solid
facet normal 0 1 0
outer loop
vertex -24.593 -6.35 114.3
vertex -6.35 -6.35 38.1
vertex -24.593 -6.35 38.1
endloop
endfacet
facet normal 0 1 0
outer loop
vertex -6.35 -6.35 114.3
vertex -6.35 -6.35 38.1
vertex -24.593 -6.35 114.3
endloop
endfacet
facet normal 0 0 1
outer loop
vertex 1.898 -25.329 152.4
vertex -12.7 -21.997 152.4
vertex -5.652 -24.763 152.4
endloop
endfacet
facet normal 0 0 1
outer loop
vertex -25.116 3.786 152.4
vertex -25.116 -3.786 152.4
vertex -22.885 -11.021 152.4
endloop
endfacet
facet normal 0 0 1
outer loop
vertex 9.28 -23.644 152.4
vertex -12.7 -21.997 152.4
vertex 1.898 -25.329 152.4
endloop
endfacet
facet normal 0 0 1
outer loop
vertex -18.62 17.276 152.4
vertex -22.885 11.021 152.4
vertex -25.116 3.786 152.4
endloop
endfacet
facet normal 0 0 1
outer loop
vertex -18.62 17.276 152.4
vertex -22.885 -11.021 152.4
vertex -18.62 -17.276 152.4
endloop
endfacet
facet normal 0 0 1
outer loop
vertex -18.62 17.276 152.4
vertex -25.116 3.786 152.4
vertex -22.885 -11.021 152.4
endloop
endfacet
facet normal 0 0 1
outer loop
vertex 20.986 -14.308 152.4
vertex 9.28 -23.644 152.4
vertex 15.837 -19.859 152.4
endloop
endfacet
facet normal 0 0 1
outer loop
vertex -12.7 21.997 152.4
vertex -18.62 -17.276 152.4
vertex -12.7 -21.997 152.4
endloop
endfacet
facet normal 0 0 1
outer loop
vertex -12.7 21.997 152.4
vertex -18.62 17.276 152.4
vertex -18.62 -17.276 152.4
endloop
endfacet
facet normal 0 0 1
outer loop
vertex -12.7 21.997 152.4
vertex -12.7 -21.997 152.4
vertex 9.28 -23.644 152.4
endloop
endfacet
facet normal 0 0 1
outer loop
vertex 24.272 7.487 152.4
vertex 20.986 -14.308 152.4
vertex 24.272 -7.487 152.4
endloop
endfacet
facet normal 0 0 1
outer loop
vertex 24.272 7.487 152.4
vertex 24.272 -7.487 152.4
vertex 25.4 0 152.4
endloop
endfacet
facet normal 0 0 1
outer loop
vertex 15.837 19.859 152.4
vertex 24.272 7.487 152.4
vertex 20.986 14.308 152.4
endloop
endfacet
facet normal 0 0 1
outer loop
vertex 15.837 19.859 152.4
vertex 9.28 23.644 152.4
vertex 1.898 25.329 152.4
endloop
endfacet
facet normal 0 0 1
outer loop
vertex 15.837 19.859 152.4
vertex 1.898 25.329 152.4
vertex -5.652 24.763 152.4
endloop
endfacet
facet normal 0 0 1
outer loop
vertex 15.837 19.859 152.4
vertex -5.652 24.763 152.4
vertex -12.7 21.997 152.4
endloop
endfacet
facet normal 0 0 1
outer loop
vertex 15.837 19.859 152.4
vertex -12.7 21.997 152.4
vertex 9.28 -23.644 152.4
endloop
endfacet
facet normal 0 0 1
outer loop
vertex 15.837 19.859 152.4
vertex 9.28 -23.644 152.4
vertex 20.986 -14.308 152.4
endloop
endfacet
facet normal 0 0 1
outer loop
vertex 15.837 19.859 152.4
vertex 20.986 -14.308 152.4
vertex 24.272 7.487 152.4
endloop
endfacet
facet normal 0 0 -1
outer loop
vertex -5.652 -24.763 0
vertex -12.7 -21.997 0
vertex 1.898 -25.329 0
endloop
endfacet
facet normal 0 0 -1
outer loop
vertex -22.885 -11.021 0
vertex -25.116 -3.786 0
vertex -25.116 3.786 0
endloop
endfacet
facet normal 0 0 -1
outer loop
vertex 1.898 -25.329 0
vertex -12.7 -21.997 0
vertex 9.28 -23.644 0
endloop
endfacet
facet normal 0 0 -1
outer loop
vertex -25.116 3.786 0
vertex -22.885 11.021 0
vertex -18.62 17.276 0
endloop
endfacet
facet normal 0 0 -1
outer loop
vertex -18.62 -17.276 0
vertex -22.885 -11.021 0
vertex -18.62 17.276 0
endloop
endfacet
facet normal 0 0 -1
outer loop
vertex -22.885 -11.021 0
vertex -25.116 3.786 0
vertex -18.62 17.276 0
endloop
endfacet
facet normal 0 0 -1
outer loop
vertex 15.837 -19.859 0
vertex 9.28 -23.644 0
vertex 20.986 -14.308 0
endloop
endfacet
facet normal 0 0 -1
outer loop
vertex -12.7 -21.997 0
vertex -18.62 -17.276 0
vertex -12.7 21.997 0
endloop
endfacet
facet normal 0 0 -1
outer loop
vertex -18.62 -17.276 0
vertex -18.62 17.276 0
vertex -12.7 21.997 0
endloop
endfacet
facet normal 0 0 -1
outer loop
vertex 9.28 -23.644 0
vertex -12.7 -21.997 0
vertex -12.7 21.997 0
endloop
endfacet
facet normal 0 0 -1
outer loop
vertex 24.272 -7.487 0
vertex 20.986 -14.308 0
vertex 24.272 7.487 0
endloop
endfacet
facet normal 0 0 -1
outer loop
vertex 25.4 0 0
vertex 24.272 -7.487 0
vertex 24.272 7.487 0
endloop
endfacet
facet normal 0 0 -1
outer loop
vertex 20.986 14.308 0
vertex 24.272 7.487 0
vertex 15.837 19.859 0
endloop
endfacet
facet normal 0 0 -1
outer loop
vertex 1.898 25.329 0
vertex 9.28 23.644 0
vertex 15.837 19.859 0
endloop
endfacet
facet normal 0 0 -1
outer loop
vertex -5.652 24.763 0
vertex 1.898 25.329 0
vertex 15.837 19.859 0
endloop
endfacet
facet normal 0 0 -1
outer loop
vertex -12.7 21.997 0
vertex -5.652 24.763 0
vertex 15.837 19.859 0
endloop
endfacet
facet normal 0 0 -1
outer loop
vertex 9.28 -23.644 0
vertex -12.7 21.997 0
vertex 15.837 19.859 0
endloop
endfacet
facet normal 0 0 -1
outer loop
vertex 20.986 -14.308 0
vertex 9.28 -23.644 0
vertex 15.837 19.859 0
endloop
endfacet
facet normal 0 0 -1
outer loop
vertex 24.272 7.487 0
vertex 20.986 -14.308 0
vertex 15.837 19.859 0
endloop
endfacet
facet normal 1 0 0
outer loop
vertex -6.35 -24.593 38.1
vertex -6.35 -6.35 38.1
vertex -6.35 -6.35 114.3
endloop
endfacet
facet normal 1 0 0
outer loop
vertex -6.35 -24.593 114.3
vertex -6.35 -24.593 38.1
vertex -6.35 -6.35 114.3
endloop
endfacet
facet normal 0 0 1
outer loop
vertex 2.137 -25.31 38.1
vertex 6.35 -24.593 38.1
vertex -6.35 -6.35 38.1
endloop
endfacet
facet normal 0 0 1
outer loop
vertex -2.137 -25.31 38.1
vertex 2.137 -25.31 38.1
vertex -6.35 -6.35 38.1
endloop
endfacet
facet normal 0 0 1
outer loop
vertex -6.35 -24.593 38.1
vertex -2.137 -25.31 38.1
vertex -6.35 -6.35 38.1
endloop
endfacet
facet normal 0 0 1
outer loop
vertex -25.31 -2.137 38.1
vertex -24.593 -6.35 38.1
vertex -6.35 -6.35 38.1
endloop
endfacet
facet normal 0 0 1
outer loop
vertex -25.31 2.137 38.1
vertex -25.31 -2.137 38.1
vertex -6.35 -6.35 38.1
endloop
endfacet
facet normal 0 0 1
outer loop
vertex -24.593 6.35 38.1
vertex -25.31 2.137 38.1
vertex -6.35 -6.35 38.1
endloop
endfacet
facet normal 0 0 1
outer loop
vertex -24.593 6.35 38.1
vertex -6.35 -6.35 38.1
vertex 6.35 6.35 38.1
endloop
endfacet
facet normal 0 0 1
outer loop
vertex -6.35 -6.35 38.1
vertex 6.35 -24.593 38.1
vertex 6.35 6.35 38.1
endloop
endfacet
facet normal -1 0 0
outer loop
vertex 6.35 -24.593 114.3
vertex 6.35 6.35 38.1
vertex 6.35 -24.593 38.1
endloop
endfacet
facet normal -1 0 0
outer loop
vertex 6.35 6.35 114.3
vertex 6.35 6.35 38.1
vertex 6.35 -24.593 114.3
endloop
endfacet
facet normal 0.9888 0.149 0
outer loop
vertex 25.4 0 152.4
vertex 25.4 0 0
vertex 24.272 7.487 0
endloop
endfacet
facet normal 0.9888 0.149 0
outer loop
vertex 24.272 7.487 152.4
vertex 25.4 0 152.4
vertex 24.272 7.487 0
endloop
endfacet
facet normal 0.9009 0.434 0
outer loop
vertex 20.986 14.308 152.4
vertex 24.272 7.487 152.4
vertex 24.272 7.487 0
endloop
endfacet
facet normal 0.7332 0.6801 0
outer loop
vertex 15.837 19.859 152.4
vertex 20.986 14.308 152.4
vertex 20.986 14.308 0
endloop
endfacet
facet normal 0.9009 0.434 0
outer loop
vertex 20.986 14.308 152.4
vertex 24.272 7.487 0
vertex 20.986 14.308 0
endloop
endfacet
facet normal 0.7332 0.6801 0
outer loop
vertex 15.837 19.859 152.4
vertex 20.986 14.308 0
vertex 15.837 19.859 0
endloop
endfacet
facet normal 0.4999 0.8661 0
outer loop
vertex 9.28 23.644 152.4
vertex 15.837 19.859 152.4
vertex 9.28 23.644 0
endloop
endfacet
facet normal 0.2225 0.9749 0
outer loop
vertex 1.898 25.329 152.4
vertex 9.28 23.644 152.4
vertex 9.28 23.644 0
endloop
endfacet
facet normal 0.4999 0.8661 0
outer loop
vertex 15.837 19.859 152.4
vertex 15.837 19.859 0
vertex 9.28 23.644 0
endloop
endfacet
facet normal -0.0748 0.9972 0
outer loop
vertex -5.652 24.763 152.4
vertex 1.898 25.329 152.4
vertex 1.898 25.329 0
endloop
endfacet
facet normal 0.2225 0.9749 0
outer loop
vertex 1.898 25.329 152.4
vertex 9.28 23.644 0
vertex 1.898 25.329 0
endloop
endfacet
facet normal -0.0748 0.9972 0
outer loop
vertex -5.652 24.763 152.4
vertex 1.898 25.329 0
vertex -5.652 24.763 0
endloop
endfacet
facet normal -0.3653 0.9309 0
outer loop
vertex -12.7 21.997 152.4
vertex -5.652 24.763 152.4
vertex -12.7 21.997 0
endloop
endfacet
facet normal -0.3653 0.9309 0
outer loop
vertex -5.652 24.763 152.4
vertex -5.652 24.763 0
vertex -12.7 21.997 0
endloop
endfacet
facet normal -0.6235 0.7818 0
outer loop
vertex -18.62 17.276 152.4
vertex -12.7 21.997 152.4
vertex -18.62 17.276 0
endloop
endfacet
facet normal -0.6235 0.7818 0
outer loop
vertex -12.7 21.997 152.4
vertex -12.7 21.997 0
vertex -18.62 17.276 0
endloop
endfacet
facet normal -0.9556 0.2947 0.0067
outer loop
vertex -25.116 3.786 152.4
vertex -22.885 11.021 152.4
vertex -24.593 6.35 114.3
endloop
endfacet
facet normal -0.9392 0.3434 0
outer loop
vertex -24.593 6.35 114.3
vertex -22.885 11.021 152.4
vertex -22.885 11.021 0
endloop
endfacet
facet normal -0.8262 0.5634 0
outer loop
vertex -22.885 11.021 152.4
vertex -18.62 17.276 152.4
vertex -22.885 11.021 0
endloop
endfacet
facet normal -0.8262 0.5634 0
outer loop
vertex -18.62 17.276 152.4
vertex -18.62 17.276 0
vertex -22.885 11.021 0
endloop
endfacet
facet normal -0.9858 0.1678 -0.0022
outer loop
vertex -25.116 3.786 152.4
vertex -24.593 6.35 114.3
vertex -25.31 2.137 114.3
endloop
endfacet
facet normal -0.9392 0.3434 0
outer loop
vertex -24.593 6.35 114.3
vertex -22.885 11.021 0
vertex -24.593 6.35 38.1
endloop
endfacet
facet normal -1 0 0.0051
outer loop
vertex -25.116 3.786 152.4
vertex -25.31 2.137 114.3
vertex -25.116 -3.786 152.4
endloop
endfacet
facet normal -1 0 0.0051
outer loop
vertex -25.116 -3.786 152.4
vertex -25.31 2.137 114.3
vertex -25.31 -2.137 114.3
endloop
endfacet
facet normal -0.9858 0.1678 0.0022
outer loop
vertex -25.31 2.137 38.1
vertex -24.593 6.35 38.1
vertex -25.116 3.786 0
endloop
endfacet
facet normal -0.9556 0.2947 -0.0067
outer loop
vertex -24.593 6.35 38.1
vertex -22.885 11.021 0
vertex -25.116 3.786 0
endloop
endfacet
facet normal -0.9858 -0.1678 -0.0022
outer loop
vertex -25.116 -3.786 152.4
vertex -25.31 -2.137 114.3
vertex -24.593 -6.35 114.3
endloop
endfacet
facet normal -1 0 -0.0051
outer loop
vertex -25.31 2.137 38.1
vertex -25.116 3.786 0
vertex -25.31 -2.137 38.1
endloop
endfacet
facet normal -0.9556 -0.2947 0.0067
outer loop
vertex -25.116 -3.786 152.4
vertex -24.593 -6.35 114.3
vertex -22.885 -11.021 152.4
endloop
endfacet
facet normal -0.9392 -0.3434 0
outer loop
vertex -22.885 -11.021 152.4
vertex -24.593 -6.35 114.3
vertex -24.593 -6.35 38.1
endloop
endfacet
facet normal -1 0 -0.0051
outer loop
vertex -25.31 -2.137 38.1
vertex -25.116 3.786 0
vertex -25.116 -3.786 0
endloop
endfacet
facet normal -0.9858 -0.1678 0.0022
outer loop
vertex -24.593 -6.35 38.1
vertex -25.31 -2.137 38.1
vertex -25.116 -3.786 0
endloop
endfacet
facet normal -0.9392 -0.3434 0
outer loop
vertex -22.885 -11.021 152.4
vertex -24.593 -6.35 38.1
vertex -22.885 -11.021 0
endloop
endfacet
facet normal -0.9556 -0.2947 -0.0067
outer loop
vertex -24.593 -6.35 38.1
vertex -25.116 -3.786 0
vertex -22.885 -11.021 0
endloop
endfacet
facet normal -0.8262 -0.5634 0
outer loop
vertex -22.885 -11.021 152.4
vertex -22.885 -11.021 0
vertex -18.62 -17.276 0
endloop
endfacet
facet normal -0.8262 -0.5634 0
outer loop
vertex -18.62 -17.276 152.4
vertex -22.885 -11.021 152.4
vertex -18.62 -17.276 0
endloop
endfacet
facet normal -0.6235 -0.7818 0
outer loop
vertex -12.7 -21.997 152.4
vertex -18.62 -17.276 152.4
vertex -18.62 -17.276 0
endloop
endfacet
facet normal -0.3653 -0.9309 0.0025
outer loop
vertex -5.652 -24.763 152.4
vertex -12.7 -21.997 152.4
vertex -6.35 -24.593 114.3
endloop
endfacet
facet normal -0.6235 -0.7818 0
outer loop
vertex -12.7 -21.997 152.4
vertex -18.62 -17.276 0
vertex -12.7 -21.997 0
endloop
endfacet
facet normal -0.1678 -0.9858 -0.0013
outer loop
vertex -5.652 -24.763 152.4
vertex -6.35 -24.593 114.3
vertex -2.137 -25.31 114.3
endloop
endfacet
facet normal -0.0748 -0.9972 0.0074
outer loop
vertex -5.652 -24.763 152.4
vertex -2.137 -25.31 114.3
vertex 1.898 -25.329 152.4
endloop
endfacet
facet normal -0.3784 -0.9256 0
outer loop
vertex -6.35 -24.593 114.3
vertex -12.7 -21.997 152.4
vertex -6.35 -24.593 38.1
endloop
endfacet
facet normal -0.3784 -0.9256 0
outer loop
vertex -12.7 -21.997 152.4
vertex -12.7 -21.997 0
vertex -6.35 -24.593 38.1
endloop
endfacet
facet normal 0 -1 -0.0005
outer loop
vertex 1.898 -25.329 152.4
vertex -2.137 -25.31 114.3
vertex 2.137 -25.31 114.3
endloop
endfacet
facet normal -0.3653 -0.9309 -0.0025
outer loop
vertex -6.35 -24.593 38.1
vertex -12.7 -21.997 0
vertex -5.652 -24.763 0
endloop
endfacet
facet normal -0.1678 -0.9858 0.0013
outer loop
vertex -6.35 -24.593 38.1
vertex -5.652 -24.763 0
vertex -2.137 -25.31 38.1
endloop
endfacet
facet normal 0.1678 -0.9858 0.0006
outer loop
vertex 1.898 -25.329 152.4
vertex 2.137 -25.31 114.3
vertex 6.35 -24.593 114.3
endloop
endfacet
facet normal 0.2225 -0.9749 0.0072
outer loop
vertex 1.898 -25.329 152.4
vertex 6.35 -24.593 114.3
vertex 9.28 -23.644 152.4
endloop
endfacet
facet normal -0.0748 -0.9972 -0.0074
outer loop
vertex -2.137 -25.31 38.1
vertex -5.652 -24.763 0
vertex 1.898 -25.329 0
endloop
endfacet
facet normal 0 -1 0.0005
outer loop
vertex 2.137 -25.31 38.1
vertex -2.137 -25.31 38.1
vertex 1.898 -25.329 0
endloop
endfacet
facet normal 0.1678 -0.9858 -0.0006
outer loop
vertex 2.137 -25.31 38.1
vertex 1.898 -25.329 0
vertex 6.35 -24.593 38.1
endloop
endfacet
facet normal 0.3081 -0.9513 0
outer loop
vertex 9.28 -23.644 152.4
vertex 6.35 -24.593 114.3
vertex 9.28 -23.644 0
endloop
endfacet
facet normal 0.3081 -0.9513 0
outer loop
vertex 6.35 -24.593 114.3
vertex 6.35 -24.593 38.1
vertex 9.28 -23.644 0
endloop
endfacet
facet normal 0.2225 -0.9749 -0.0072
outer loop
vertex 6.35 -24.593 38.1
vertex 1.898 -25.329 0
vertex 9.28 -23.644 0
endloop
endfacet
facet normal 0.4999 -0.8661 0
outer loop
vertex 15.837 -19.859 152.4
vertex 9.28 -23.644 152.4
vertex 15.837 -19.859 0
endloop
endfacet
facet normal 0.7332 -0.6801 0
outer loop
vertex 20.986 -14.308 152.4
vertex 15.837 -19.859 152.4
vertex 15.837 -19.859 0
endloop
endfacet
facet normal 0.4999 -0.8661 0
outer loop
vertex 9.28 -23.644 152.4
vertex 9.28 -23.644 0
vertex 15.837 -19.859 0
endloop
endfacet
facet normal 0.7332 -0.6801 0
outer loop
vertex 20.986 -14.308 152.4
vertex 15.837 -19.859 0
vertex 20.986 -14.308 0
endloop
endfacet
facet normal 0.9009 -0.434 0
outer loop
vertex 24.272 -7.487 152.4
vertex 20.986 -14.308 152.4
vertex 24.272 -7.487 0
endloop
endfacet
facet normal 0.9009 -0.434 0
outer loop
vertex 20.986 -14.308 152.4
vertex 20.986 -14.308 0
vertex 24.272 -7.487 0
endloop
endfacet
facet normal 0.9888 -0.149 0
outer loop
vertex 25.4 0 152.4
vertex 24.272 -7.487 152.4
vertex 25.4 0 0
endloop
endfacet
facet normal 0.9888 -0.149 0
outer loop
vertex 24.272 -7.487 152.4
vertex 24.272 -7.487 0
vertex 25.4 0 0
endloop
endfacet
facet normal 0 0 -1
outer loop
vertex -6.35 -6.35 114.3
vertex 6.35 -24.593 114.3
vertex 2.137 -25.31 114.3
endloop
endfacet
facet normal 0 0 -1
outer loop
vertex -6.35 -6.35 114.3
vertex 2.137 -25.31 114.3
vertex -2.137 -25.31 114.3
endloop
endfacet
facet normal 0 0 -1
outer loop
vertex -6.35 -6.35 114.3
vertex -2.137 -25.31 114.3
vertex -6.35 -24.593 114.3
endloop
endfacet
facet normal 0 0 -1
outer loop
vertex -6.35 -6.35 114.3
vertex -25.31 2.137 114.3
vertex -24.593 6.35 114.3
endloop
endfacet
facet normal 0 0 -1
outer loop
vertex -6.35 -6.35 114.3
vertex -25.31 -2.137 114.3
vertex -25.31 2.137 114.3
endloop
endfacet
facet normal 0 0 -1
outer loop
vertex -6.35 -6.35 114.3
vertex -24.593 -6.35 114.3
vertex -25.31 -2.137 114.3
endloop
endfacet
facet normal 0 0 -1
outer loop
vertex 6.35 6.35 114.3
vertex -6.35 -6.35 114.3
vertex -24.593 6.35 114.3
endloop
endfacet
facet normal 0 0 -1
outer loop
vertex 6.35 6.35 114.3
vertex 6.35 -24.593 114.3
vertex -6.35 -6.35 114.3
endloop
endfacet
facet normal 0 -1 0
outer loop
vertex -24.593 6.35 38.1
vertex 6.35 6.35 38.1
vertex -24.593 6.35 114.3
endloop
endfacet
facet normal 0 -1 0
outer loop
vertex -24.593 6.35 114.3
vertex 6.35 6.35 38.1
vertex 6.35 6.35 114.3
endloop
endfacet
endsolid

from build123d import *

# Parameters (mm, degrees)
F0_R      = 25.4
F1_DEPTH  = 152.4
F2_W      = 12.7
F2_H      = 76.2
F3_DEPTH  = 25.4
F4_W      = 12.7
F4_H      = 76.2
F5_DEPTH  = 38.1
F5_FACE_W = 6.35
F5_FACE_H = 76.2
F6_DEPTH  = 6.35


with BuildPart() as f1:
    # F0 (on Top) → F1 (new body)
    with BuildSketch(Plane.XY):
        Circle(F0_R)
    extrude(amount=F1_DEPTH)

    # F2 (on Right) → F3 (cut)
    with BuildSketch(Plane.YZ):
        with Locations((0, 76.2)):
            Rectangle(F2_W, F2_H)
    extrude(amount=-F3_DEPTH, mode=Mode.SUBTRACT)

    # F4 (on Front) → F5 (cut)
    with BuildSketch(Plane.XZ):
        with Locations((0, 76.2)):
            Rectangle(F4_W, F4_H)
    extrude(amount=F5_DEPTH, mode=Mode.SUBTRACT)

    # F5_face (on face) → F6 (cut)
    with BuildSketch(Plane(origin=(3.175, 0, 76.2), x_dir=(1, 0, 0), z_dir=(0, -1, 0))):
        Rectangle(F5_FACE_W, F5_FACE_H)
    extrude(amount=-F6_DEPTH, mode=Mode.SUBTRACT)


solid = f1.part
